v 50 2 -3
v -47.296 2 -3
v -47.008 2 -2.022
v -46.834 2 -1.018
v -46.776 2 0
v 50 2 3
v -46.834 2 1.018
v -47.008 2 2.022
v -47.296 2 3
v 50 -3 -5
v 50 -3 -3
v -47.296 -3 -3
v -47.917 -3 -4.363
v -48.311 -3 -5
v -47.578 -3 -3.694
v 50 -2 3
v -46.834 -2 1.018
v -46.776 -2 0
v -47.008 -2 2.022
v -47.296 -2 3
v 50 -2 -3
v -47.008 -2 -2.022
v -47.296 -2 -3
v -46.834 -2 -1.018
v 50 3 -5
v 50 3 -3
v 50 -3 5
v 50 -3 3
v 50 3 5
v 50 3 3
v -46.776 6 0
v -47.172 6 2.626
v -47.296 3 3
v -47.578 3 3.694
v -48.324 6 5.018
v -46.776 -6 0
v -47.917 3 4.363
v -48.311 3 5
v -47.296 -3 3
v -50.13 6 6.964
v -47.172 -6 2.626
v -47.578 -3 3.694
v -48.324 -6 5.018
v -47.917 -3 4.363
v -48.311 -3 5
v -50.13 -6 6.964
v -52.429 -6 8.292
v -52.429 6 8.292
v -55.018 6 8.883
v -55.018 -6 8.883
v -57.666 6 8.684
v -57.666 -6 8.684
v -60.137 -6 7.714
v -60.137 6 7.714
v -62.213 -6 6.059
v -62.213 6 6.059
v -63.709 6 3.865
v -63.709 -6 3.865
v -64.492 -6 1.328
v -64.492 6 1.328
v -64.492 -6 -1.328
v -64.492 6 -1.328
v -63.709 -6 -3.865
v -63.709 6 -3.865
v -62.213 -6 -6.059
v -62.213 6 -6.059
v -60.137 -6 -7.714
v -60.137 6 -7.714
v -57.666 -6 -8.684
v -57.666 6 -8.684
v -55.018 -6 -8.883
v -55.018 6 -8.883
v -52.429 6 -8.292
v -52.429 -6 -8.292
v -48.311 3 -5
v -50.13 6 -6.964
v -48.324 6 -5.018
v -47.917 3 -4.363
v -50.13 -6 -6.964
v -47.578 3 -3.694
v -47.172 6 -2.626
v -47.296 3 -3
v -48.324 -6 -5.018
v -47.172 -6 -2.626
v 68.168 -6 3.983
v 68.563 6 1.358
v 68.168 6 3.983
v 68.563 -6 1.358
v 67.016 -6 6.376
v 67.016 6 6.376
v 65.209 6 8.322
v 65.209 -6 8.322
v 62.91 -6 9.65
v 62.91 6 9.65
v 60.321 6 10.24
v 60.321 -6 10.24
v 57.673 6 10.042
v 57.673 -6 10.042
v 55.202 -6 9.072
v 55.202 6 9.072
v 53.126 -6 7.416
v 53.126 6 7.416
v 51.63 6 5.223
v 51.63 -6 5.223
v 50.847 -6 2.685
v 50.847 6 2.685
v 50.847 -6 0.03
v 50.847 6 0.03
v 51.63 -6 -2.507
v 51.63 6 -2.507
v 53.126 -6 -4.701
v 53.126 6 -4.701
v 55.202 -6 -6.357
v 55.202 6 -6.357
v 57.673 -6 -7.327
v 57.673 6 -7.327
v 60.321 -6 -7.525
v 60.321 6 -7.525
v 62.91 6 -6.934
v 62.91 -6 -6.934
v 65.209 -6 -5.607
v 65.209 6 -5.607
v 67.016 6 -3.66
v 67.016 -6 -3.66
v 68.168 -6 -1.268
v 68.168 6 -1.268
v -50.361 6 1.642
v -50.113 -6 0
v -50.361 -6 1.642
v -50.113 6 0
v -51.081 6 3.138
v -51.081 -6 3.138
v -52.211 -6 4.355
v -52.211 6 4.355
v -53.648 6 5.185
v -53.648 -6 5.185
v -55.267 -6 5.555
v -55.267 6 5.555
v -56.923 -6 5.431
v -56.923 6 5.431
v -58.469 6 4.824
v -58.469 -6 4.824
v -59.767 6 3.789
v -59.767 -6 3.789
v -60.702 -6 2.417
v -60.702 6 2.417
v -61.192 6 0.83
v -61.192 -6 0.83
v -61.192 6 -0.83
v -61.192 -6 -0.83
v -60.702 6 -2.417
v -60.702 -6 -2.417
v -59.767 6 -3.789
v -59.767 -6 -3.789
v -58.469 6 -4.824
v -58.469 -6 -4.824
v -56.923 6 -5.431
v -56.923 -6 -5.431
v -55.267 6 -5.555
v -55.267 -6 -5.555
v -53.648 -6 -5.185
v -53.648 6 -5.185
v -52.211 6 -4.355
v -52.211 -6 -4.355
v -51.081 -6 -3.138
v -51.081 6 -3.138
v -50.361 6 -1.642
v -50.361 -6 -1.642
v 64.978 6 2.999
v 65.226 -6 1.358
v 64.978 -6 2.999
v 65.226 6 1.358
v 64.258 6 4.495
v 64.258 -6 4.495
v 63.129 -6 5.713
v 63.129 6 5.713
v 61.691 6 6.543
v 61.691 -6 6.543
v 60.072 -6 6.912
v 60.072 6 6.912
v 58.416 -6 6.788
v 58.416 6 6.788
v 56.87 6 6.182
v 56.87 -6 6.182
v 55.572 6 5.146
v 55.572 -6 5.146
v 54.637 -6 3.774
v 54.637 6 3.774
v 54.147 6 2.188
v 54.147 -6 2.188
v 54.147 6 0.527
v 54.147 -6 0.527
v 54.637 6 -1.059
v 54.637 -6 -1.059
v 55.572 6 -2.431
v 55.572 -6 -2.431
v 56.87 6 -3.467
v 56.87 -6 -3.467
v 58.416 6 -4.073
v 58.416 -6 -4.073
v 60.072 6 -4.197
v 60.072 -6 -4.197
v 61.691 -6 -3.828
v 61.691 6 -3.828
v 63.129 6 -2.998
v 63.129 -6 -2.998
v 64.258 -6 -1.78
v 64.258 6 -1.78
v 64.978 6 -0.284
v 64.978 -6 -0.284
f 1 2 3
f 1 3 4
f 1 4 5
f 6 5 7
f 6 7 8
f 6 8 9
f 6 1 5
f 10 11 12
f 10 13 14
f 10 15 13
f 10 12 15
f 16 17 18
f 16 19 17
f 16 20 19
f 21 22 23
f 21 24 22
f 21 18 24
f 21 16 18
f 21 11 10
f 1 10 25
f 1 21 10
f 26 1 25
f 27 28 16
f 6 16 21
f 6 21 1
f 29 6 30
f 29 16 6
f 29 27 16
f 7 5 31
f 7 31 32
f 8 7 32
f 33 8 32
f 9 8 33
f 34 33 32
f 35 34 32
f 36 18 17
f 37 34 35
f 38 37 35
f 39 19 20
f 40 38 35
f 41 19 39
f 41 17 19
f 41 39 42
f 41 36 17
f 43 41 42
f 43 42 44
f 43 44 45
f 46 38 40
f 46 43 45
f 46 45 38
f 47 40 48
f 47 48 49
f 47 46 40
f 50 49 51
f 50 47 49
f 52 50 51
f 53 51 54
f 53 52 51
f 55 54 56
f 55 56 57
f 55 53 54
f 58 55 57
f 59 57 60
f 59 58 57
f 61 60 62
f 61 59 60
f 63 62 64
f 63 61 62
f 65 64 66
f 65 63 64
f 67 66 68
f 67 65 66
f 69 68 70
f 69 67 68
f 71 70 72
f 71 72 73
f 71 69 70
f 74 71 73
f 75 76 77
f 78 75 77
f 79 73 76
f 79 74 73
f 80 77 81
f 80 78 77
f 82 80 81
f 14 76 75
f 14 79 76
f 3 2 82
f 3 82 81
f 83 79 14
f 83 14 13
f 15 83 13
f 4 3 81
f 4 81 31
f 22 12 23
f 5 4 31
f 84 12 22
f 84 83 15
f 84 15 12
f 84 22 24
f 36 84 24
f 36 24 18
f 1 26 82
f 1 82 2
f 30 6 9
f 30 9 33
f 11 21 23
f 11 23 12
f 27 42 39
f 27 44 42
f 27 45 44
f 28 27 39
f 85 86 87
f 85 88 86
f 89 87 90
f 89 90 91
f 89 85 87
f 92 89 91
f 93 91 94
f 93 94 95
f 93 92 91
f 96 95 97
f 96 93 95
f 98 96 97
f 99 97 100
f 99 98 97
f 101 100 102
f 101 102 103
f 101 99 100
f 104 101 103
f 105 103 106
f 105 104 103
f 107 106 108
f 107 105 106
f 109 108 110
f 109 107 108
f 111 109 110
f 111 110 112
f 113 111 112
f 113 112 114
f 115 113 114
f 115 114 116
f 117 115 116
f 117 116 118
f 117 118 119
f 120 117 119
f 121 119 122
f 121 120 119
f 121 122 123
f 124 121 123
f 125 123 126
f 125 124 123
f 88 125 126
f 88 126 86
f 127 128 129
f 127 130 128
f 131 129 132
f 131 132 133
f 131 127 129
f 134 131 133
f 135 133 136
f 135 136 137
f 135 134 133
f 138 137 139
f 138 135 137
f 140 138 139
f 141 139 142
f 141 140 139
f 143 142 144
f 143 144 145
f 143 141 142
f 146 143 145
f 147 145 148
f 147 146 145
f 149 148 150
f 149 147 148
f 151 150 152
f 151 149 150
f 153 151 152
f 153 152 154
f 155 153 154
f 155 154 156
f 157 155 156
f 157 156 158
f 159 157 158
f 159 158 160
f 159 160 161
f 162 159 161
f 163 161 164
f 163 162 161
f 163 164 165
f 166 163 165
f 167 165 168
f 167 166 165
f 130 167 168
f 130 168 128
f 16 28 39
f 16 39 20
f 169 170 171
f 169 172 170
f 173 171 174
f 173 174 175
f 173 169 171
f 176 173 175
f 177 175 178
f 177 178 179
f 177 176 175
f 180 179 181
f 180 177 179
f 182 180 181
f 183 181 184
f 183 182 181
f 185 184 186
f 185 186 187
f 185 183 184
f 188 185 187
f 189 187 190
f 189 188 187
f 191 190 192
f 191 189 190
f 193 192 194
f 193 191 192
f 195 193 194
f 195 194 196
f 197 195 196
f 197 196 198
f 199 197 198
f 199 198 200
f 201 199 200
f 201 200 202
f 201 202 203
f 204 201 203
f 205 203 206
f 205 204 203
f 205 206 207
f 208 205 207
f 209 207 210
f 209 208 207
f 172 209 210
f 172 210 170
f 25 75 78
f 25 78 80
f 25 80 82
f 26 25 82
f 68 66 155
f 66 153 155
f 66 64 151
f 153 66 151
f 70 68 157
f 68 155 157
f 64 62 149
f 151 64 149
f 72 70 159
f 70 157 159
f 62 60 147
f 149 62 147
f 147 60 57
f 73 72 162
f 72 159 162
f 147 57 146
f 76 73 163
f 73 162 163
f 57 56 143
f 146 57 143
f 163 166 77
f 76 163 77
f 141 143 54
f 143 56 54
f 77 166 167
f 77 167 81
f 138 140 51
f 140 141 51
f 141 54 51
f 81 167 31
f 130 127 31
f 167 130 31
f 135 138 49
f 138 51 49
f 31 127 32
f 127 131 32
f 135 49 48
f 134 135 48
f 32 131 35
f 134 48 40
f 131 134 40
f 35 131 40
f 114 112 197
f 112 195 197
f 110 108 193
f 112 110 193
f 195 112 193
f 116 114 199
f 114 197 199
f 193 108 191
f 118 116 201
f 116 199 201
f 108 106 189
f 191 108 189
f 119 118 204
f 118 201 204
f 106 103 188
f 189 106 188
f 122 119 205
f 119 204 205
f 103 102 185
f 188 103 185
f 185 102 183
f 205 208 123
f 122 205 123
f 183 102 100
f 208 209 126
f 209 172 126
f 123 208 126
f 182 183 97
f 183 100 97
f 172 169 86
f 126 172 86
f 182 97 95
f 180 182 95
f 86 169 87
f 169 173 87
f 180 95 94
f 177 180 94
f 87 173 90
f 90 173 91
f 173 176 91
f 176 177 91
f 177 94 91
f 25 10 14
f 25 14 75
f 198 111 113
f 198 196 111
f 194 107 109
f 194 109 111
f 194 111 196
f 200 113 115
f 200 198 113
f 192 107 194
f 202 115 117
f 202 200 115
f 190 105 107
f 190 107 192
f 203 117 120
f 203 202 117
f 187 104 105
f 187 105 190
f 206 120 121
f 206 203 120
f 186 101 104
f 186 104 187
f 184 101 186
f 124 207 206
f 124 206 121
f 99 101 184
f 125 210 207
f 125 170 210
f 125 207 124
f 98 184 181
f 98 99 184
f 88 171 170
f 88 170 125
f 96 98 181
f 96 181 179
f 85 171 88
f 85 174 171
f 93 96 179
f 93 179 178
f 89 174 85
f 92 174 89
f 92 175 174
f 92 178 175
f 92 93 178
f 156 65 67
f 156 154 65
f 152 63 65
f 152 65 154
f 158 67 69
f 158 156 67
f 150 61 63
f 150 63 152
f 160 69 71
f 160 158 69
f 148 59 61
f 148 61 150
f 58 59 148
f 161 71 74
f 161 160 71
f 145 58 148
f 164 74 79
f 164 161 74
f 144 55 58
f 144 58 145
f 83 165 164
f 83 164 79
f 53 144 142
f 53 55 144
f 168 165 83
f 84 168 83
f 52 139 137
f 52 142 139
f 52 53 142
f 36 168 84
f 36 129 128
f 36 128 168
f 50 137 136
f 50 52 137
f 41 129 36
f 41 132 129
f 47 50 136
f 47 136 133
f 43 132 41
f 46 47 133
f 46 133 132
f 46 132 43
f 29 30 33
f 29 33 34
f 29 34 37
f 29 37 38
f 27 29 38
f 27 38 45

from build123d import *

# Parameters (mm, degrees)
F1_DEPTH = 50
F2_R     = 8.9077979458
F2_R_2   = 5.5703781545
F3_DEPTH = 6


with BuildPart() as f1:
    # F0 (on Right) → F1 (new body, symmetric)
    with BuildSketch(Plane.YZ):
        Polygon((0, -3), (-2, -3), (-3, -3), (-3, -5), (0, -5), (3, -5), (3, -3), (2, -3), align=None)
        Polygon((0, 3), (-2, 3), (-2, -3), (0, -3), (0, 0), align=None)
        Polygon((2, 3), (0, 3), (0, 0), (0, -3), (2, -3), align=None)
        Polygon((0, 5), (-3, 5), (-3, 3), (-2, 3), (0, 3), (2, 3), (3, 3), (3, 5), align=None)
    extrude(amount=F1_DEPTH, both=True)

    # F2 (on Front) → F3 (join, symmetric)
    with BuildSketch(Plane.XZ):
        with Locations((-55.6835867465, 0)):
            Circle(F2_R)
        with Locations((-55.6835867465, 0)):
            Circle(F2_R_2, mode=Mode.SUBTRACT)
    extrude(amount=F3_DEPTH, both=True)


with BuildPart() as f3:
    # F2 (on Front) → F3, piece 2 (new body, symmetric)
    with BuildSketch(Plane.XZ):
        with Locations((59.655547142, 1.357564237)):
            Circle(F2_R)
        with Locations((59.655547142, 1.357564237)):
            Circle(F2_R_2, mode=Mode.SUBTRACT)
    extrude(amount=F3_DEPTH, both=True)


solid = Compound([f1.part, f3.part])
